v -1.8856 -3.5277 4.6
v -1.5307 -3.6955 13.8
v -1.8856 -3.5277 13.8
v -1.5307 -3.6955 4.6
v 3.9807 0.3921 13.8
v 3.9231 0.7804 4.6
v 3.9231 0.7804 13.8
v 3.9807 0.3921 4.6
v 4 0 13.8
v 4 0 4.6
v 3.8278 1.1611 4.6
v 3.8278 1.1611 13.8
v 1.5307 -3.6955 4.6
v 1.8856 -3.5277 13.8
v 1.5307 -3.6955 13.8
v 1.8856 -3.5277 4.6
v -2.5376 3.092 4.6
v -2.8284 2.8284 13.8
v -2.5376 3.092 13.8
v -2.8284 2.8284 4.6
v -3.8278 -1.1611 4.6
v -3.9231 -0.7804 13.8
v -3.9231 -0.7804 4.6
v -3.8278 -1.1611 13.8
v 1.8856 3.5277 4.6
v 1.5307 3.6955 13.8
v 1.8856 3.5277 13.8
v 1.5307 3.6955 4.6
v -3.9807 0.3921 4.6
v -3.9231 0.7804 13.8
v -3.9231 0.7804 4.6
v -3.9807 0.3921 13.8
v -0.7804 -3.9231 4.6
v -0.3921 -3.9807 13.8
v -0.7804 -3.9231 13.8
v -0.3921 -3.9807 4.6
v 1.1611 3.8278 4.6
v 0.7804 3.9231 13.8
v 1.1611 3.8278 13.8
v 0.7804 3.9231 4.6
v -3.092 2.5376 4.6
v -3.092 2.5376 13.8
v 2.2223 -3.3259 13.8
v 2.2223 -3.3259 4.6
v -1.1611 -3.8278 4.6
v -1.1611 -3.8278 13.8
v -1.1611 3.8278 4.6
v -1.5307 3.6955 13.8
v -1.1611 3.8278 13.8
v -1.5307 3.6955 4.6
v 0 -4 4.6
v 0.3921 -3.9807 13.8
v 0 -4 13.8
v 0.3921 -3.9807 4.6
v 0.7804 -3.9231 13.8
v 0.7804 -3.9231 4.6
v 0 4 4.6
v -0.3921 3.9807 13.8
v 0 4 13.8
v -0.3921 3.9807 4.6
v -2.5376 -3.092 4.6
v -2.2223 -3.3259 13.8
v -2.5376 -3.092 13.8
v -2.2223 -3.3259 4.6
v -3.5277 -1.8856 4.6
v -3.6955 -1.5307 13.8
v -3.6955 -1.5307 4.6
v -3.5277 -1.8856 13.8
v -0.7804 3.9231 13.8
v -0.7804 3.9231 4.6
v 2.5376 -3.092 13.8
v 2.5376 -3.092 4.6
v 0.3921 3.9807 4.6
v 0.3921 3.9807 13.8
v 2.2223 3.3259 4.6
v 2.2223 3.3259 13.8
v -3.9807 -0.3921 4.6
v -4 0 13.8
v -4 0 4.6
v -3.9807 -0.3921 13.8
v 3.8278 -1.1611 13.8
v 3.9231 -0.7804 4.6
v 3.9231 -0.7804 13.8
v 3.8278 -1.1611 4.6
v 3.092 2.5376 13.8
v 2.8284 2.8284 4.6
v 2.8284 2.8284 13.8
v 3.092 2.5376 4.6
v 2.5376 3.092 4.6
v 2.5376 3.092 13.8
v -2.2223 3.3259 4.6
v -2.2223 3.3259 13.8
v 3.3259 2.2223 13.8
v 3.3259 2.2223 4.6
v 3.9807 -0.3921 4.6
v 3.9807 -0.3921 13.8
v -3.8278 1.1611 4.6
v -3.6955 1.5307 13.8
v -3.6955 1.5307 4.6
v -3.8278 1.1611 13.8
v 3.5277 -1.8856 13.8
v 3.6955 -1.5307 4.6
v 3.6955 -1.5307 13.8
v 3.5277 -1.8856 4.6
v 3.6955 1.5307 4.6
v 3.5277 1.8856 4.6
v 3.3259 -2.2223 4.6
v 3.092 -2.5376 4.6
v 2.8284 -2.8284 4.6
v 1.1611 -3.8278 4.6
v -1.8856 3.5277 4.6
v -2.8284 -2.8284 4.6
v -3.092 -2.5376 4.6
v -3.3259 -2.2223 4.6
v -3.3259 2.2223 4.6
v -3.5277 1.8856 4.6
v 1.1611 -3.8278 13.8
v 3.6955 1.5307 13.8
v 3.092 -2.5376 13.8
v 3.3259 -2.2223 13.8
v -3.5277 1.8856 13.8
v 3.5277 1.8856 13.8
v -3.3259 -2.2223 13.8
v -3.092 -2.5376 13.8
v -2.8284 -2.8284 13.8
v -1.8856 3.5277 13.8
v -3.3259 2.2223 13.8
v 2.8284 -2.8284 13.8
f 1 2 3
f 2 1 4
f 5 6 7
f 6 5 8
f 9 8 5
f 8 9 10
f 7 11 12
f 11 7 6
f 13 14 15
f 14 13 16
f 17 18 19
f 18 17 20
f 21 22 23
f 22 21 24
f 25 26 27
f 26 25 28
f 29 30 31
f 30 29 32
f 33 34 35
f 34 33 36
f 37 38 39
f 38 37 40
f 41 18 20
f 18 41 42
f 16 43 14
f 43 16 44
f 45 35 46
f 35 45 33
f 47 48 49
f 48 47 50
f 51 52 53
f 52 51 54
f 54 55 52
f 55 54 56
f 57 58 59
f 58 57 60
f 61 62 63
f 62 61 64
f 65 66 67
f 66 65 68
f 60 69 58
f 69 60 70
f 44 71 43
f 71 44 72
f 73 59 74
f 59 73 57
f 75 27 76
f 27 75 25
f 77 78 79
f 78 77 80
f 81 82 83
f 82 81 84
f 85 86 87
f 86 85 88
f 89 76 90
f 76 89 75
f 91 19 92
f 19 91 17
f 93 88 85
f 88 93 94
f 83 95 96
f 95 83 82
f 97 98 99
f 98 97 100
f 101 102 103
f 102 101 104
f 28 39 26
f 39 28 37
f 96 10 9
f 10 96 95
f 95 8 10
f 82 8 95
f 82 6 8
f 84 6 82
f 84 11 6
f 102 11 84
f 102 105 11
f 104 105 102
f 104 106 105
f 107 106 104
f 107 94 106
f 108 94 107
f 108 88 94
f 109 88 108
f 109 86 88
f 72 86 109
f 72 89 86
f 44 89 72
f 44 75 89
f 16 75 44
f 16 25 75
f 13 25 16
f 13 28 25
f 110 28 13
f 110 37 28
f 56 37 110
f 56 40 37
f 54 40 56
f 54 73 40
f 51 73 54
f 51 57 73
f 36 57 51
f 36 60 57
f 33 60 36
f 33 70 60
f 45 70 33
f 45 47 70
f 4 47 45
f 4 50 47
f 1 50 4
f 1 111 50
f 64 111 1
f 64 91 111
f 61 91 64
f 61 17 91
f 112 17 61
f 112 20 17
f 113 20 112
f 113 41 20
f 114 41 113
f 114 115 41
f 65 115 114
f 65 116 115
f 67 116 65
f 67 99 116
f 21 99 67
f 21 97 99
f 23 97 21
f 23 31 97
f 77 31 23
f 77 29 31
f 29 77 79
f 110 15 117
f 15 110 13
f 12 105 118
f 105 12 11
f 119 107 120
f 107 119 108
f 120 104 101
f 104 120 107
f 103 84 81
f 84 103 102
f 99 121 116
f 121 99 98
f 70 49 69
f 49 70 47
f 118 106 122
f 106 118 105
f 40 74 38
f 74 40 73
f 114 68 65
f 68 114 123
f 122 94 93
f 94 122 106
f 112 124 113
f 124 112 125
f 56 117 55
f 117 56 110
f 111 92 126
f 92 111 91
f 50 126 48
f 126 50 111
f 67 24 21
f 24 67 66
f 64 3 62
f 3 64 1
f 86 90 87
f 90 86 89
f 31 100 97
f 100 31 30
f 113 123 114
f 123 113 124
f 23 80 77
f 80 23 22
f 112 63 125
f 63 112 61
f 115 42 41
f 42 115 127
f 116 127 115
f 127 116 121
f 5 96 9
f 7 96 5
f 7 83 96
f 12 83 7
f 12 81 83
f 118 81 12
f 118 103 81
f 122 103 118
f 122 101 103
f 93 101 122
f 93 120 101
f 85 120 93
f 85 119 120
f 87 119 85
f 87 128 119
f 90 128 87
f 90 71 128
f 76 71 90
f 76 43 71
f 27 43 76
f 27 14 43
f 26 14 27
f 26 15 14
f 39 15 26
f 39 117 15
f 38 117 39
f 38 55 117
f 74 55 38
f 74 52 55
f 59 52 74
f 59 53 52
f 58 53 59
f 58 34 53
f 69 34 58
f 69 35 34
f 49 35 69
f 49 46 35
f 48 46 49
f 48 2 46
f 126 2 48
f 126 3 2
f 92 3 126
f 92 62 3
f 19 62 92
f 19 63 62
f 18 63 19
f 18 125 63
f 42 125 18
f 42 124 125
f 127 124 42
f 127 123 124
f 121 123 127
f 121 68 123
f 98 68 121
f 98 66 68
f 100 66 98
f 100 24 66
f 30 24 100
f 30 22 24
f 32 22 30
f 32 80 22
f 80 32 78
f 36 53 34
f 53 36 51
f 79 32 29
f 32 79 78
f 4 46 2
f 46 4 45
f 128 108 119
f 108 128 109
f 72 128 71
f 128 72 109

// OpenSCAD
module led() {
    union() {
        // LED body
        translate([0, 0, 4.6])
            cylinder(h=9.2, d=8.0, $fn=64);
        
        // LED dome
        translate([0, 0, 9.2])
            sphere(d=8.0, $fn=64);
    }
}

led();
